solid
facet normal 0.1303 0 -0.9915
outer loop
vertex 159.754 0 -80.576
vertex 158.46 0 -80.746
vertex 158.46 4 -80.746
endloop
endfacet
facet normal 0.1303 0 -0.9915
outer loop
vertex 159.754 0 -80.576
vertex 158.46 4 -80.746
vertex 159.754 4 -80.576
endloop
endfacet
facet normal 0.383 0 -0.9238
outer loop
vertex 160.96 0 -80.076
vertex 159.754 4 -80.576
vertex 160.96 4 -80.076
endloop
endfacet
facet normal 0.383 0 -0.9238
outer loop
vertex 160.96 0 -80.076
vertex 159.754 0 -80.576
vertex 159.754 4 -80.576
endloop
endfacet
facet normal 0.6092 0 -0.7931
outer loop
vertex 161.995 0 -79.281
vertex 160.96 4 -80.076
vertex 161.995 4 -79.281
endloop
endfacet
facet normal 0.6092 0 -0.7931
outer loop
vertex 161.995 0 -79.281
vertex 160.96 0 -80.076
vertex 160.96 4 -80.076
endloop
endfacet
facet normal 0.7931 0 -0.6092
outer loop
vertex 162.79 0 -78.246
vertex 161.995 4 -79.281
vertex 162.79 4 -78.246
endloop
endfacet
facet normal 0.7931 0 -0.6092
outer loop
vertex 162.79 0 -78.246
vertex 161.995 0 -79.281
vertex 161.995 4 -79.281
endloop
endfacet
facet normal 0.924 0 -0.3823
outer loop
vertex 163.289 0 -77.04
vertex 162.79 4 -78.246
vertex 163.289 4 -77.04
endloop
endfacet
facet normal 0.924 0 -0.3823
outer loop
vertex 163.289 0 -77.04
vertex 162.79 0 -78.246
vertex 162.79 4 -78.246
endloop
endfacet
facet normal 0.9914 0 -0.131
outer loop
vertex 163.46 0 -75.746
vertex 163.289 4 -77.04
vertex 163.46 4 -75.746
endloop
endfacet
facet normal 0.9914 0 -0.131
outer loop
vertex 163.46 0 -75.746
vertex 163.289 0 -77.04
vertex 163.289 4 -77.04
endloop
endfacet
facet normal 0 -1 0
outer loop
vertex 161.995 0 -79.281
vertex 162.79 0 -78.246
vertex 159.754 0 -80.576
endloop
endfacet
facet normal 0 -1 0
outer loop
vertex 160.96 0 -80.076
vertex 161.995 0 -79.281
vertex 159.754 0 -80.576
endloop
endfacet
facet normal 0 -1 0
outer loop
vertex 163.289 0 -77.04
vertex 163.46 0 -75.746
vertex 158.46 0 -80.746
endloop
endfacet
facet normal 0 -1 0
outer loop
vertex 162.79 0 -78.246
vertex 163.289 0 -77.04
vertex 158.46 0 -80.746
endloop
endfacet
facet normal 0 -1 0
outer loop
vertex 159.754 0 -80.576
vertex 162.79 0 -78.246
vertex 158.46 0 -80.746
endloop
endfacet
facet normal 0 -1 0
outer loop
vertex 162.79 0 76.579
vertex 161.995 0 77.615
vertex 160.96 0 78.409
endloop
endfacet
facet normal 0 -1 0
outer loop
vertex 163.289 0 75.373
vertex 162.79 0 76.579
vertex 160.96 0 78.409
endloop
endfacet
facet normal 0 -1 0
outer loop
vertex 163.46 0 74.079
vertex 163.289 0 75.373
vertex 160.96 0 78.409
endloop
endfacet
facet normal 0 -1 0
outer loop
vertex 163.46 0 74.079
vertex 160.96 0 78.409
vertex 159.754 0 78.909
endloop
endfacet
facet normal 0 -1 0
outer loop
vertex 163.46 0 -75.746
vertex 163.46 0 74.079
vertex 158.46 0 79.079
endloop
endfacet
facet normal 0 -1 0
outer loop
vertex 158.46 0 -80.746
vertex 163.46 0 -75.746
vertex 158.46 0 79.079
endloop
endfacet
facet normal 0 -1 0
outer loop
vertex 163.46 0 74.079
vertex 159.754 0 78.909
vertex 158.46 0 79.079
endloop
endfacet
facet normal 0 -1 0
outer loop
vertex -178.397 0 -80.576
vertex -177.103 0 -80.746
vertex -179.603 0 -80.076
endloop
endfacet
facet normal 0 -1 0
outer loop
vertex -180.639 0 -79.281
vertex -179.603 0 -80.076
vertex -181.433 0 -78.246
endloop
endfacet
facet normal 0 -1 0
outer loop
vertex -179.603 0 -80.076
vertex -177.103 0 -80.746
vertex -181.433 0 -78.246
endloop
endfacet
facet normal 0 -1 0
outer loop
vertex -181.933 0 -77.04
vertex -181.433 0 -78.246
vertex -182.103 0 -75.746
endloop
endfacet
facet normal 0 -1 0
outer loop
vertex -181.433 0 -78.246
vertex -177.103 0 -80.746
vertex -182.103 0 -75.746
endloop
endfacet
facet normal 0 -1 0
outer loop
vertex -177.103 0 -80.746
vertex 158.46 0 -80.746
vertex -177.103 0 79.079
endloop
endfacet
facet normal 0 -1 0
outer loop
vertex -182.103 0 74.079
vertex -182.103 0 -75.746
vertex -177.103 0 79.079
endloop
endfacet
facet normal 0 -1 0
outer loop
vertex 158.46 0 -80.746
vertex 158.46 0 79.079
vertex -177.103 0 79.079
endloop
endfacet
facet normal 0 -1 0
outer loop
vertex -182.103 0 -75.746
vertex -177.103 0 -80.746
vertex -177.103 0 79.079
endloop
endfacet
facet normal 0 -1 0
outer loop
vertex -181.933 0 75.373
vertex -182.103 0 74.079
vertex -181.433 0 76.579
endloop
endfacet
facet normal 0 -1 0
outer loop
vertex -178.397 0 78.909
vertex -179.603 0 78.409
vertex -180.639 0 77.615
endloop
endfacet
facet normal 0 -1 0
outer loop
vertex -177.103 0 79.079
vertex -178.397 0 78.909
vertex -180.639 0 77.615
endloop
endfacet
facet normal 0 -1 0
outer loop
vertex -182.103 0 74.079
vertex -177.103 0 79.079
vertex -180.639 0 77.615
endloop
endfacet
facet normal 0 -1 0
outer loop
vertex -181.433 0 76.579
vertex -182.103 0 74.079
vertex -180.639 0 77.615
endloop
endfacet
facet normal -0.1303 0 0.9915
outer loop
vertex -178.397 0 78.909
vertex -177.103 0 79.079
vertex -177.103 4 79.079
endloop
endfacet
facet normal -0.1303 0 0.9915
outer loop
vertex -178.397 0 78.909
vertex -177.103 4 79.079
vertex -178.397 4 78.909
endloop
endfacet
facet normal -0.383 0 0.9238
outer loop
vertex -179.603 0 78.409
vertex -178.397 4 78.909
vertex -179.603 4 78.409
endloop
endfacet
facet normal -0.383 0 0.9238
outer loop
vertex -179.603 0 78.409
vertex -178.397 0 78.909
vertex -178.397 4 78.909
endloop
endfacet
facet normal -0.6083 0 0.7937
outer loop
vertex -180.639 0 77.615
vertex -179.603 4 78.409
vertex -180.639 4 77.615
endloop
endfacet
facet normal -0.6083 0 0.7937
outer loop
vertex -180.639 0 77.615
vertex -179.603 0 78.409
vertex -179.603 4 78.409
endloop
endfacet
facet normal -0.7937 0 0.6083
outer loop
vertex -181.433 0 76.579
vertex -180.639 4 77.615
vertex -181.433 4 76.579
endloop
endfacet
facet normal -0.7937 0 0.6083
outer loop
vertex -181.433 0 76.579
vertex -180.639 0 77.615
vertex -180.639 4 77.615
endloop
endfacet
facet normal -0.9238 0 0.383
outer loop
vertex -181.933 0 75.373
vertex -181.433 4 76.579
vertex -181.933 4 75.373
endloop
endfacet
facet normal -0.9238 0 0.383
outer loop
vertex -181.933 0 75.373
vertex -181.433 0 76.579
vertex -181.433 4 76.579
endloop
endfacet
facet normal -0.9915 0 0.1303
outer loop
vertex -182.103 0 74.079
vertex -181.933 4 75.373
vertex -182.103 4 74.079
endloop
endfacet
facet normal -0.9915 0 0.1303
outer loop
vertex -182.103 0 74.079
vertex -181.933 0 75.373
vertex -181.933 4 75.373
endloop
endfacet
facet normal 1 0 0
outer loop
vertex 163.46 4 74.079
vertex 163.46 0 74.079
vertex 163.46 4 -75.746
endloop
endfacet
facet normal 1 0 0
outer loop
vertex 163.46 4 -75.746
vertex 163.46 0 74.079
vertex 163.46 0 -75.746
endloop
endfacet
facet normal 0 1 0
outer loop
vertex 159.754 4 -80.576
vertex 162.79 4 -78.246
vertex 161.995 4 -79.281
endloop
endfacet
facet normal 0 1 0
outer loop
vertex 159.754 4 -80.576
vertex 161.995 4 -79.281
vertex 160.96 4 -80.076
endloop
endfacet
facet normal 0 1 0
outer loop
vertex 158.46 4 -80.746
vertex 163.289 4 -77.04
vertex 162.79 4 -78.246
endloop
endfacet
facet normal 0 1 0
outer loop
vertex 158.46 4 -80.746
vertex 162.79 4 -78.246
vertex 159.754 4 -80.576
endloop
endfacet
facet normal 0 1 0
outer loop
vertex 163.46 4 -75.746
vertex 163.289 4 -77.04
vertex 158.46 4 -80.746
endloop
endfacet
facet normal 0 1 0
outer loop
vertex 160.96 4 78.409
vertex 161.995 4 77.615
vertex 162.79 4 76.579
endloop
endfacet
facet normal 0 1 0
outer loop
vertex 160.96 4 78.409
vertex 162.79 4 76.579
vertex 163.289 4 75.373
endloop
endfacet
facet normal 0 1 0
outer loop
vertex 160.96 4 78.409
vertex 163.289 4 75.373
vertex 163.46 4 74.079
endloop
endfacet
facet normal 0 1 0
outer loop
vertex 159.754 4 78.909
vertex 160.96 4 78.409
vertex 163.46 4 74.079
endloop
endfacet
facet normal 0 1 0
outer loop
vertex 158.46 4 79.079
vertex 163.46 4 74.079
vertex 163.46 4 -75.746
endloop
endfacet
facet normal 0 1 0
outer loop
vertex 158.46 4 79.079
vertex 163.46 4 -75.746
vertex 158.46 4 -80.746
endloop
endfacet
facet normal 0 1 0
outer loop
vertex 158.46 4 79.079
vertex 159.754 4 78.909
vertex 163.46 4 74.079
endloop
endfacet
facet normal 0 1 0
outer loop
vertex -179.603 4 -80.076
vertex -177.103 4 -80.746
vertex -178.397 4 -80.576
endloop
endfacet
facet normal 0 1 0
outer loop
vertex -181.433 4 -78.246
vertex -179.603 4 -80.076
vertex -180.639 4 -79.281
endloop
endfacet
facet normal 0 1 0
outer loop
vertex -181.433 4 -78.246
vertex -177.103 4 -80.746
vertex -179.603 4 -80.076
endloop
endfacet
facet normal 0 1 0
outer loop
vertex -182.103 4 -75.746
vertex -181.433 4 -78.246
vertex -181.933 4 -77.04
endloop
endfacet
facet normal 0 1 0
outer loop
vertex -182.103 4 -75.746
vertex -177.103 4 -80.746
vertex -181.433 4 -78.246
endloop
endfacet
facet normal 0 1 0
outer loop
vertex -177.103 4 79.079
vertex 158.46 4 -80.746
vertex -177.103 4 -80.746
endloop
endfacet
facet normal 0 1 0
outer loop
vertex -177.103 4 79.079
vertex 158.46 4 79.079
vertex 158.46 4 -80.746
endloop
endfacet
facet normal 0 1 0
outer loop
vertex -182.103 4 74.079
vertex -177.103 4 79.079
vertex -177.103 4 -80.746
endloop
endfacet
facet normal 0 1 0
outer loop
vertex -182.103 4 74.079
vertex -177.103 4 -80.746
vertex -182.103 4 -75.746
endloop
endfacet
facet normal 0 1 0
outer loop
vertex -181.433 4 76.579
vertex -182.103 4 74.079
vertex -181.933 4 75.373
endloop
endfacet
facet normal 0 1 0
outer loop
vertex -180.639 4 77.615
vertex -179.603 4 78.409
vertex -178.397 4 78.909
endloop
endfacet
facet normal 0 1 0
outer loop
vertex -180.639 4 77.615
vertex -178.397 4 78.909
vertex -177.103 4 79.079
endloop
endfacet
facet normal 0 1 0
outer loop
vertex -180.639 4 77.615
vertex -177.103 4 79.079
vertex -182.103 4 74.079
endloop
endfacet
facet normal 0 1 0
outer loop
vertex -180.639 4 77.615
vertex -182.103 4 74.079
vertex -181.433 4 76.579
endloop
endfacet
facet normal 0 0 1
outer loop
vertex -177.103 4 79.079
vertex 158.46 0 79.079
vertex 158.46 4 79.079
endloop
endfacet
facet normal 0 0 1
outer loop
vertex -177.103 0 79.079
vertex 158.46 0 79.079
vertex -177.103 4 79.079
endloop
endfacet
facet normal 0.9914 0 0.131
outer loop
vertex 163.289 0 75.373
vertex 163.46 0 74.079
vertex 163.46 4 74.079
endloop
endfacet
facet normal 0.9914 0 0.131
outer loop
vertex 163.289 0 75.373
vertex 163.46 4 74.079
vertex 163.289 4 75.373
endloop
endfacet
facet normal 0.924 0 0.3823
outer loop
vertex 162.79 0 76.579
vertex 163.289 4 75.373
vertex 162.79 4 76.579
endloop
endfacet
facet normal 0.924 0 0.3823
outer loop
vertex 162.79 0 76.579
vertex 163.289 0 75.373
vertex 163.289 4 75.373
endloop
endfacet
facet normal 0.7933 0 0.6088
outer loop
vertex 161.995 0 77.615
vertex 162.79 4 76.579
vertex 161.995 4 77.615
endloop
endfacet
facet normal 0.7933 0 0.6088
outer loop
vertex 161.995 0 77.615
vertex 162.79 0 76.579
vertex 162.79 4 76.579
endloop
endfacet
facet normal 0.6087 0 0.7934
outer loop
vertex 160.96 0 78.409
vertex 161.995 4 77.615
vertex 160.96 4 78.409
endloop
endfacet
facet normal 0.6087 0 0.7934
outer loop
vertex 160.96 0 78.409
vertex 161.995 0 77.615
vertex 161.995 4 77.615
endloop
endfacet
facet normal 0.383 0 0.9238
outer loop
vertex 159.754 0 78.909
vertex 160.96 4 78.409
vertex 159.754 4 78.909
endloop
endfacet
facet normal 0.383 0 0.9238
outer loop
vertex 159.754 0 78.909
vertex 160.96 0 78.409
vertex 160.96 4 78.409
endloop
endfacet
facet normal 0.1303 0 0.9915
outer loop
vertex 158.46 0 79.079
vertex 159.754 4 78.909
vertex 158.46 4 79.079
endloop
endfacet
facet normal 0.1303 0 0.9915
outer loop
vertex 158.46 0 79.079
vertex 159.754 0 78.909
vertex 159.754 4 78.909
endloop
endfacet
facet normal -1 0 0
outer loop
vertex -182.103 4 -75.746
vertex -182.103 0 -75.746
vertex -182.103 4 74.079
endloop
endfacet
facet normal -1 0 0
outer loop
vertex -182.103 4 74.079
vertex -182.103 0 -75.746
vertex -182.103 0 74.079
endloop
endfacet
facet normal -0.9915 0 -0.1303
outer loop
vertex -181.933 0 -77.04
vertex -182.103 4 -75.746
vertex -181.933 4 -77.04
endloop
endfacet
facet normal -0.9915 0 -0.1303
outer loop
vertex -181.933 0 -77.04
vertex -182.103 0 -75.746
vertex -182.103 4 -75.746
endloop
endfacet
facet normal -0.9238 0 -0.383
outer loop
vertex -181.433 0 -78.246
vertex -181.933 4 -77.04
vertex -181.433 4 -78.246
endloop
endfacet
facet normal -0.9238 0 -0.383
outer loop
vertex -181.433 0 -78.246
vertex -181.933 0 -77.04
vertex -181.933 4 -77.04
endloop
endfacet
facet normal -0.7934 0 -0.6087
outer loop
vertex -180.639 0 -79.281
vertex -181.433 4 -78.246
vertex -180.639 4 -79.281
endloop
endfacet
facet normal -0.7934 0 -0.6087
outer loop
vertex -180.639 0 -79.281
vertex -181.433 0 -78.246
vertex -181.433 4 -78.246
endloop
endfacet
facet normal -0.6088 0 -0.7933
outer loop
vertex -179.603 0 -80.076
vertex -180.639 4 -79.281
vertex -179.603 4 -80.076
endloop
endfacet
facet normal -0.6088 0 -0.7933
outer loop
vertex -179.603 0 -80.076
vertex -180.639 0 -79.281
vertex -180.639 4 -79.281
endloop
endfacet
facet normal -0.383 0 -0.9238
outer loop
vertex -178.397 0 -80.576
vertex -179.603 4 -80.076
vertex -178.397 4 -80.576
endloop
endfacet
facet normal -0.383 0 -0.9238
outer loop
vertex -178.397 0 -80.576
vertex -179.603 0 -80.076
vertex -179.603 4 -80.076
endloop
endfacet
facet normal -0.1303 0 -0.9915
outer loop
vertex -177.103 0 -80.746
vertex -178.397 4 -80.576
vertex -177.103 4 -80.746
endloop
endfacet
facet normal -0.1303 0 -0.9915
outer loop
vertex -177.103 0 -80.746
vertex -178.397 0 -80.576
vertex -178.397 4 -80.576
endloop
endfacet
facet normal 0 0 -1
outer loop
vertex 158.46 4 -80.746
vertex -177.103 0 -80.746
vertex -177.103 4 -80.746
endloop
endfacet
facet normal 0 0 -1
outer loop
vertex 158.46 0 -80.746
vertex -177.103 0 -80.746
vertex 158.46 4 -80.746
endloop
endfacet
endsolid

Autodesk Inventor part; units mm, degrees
ref_plane "YZ Plane" through (0, 0, 0) normal (1, 0, 0) x (0, 1, 0)
ref_plane "XZ Plane" through (0, 0, 0) normal (0, 1, 0) x (-1, 0, 0)
ref_plane "XY Plane" through (0, 0, 0) normal (0, 0, 1) x (1, 0, 0)
sketch "Sketch1" plane through (0, 0, 0) normal (0, 1, 0) x (-1, 0, 0)
  line L0 (-163.4597, 74.0791) -> (-163.4597, -75.7459)
  line L1 (-158.4597, 79.0791) -> (177.1033, 79.0791)
  arc A0 (-158.4597, 79.0791) -> (-163.4597, 74.0791) centre (-158.4597, 74.0791) ccw
  arc A1 (-163.4597, -75.7459) -> (-158.4597, -80.7459) centre (-158.4597, -75.7459) ccw
  line L2 (182.1033, -75.7459) -> (182.1033, 74.0791)
  line L3 (177.1033, -80.7459) -> (-158.4597, -80.7459)
  arc A2 (177.1033, -80.7459) -> (182.1033, -75.7459) centre (177.1033, -75.7459) ccw
  arc A3 (182.1033, 74.0791) -> (177.1033, 79.0791) centre (177.1033, 74.0791) ccw
  point P0 (0, 0)
extrude "Extrusion1" add sketch "Sketch1" along normal blind 4
properties part number "layer1"
